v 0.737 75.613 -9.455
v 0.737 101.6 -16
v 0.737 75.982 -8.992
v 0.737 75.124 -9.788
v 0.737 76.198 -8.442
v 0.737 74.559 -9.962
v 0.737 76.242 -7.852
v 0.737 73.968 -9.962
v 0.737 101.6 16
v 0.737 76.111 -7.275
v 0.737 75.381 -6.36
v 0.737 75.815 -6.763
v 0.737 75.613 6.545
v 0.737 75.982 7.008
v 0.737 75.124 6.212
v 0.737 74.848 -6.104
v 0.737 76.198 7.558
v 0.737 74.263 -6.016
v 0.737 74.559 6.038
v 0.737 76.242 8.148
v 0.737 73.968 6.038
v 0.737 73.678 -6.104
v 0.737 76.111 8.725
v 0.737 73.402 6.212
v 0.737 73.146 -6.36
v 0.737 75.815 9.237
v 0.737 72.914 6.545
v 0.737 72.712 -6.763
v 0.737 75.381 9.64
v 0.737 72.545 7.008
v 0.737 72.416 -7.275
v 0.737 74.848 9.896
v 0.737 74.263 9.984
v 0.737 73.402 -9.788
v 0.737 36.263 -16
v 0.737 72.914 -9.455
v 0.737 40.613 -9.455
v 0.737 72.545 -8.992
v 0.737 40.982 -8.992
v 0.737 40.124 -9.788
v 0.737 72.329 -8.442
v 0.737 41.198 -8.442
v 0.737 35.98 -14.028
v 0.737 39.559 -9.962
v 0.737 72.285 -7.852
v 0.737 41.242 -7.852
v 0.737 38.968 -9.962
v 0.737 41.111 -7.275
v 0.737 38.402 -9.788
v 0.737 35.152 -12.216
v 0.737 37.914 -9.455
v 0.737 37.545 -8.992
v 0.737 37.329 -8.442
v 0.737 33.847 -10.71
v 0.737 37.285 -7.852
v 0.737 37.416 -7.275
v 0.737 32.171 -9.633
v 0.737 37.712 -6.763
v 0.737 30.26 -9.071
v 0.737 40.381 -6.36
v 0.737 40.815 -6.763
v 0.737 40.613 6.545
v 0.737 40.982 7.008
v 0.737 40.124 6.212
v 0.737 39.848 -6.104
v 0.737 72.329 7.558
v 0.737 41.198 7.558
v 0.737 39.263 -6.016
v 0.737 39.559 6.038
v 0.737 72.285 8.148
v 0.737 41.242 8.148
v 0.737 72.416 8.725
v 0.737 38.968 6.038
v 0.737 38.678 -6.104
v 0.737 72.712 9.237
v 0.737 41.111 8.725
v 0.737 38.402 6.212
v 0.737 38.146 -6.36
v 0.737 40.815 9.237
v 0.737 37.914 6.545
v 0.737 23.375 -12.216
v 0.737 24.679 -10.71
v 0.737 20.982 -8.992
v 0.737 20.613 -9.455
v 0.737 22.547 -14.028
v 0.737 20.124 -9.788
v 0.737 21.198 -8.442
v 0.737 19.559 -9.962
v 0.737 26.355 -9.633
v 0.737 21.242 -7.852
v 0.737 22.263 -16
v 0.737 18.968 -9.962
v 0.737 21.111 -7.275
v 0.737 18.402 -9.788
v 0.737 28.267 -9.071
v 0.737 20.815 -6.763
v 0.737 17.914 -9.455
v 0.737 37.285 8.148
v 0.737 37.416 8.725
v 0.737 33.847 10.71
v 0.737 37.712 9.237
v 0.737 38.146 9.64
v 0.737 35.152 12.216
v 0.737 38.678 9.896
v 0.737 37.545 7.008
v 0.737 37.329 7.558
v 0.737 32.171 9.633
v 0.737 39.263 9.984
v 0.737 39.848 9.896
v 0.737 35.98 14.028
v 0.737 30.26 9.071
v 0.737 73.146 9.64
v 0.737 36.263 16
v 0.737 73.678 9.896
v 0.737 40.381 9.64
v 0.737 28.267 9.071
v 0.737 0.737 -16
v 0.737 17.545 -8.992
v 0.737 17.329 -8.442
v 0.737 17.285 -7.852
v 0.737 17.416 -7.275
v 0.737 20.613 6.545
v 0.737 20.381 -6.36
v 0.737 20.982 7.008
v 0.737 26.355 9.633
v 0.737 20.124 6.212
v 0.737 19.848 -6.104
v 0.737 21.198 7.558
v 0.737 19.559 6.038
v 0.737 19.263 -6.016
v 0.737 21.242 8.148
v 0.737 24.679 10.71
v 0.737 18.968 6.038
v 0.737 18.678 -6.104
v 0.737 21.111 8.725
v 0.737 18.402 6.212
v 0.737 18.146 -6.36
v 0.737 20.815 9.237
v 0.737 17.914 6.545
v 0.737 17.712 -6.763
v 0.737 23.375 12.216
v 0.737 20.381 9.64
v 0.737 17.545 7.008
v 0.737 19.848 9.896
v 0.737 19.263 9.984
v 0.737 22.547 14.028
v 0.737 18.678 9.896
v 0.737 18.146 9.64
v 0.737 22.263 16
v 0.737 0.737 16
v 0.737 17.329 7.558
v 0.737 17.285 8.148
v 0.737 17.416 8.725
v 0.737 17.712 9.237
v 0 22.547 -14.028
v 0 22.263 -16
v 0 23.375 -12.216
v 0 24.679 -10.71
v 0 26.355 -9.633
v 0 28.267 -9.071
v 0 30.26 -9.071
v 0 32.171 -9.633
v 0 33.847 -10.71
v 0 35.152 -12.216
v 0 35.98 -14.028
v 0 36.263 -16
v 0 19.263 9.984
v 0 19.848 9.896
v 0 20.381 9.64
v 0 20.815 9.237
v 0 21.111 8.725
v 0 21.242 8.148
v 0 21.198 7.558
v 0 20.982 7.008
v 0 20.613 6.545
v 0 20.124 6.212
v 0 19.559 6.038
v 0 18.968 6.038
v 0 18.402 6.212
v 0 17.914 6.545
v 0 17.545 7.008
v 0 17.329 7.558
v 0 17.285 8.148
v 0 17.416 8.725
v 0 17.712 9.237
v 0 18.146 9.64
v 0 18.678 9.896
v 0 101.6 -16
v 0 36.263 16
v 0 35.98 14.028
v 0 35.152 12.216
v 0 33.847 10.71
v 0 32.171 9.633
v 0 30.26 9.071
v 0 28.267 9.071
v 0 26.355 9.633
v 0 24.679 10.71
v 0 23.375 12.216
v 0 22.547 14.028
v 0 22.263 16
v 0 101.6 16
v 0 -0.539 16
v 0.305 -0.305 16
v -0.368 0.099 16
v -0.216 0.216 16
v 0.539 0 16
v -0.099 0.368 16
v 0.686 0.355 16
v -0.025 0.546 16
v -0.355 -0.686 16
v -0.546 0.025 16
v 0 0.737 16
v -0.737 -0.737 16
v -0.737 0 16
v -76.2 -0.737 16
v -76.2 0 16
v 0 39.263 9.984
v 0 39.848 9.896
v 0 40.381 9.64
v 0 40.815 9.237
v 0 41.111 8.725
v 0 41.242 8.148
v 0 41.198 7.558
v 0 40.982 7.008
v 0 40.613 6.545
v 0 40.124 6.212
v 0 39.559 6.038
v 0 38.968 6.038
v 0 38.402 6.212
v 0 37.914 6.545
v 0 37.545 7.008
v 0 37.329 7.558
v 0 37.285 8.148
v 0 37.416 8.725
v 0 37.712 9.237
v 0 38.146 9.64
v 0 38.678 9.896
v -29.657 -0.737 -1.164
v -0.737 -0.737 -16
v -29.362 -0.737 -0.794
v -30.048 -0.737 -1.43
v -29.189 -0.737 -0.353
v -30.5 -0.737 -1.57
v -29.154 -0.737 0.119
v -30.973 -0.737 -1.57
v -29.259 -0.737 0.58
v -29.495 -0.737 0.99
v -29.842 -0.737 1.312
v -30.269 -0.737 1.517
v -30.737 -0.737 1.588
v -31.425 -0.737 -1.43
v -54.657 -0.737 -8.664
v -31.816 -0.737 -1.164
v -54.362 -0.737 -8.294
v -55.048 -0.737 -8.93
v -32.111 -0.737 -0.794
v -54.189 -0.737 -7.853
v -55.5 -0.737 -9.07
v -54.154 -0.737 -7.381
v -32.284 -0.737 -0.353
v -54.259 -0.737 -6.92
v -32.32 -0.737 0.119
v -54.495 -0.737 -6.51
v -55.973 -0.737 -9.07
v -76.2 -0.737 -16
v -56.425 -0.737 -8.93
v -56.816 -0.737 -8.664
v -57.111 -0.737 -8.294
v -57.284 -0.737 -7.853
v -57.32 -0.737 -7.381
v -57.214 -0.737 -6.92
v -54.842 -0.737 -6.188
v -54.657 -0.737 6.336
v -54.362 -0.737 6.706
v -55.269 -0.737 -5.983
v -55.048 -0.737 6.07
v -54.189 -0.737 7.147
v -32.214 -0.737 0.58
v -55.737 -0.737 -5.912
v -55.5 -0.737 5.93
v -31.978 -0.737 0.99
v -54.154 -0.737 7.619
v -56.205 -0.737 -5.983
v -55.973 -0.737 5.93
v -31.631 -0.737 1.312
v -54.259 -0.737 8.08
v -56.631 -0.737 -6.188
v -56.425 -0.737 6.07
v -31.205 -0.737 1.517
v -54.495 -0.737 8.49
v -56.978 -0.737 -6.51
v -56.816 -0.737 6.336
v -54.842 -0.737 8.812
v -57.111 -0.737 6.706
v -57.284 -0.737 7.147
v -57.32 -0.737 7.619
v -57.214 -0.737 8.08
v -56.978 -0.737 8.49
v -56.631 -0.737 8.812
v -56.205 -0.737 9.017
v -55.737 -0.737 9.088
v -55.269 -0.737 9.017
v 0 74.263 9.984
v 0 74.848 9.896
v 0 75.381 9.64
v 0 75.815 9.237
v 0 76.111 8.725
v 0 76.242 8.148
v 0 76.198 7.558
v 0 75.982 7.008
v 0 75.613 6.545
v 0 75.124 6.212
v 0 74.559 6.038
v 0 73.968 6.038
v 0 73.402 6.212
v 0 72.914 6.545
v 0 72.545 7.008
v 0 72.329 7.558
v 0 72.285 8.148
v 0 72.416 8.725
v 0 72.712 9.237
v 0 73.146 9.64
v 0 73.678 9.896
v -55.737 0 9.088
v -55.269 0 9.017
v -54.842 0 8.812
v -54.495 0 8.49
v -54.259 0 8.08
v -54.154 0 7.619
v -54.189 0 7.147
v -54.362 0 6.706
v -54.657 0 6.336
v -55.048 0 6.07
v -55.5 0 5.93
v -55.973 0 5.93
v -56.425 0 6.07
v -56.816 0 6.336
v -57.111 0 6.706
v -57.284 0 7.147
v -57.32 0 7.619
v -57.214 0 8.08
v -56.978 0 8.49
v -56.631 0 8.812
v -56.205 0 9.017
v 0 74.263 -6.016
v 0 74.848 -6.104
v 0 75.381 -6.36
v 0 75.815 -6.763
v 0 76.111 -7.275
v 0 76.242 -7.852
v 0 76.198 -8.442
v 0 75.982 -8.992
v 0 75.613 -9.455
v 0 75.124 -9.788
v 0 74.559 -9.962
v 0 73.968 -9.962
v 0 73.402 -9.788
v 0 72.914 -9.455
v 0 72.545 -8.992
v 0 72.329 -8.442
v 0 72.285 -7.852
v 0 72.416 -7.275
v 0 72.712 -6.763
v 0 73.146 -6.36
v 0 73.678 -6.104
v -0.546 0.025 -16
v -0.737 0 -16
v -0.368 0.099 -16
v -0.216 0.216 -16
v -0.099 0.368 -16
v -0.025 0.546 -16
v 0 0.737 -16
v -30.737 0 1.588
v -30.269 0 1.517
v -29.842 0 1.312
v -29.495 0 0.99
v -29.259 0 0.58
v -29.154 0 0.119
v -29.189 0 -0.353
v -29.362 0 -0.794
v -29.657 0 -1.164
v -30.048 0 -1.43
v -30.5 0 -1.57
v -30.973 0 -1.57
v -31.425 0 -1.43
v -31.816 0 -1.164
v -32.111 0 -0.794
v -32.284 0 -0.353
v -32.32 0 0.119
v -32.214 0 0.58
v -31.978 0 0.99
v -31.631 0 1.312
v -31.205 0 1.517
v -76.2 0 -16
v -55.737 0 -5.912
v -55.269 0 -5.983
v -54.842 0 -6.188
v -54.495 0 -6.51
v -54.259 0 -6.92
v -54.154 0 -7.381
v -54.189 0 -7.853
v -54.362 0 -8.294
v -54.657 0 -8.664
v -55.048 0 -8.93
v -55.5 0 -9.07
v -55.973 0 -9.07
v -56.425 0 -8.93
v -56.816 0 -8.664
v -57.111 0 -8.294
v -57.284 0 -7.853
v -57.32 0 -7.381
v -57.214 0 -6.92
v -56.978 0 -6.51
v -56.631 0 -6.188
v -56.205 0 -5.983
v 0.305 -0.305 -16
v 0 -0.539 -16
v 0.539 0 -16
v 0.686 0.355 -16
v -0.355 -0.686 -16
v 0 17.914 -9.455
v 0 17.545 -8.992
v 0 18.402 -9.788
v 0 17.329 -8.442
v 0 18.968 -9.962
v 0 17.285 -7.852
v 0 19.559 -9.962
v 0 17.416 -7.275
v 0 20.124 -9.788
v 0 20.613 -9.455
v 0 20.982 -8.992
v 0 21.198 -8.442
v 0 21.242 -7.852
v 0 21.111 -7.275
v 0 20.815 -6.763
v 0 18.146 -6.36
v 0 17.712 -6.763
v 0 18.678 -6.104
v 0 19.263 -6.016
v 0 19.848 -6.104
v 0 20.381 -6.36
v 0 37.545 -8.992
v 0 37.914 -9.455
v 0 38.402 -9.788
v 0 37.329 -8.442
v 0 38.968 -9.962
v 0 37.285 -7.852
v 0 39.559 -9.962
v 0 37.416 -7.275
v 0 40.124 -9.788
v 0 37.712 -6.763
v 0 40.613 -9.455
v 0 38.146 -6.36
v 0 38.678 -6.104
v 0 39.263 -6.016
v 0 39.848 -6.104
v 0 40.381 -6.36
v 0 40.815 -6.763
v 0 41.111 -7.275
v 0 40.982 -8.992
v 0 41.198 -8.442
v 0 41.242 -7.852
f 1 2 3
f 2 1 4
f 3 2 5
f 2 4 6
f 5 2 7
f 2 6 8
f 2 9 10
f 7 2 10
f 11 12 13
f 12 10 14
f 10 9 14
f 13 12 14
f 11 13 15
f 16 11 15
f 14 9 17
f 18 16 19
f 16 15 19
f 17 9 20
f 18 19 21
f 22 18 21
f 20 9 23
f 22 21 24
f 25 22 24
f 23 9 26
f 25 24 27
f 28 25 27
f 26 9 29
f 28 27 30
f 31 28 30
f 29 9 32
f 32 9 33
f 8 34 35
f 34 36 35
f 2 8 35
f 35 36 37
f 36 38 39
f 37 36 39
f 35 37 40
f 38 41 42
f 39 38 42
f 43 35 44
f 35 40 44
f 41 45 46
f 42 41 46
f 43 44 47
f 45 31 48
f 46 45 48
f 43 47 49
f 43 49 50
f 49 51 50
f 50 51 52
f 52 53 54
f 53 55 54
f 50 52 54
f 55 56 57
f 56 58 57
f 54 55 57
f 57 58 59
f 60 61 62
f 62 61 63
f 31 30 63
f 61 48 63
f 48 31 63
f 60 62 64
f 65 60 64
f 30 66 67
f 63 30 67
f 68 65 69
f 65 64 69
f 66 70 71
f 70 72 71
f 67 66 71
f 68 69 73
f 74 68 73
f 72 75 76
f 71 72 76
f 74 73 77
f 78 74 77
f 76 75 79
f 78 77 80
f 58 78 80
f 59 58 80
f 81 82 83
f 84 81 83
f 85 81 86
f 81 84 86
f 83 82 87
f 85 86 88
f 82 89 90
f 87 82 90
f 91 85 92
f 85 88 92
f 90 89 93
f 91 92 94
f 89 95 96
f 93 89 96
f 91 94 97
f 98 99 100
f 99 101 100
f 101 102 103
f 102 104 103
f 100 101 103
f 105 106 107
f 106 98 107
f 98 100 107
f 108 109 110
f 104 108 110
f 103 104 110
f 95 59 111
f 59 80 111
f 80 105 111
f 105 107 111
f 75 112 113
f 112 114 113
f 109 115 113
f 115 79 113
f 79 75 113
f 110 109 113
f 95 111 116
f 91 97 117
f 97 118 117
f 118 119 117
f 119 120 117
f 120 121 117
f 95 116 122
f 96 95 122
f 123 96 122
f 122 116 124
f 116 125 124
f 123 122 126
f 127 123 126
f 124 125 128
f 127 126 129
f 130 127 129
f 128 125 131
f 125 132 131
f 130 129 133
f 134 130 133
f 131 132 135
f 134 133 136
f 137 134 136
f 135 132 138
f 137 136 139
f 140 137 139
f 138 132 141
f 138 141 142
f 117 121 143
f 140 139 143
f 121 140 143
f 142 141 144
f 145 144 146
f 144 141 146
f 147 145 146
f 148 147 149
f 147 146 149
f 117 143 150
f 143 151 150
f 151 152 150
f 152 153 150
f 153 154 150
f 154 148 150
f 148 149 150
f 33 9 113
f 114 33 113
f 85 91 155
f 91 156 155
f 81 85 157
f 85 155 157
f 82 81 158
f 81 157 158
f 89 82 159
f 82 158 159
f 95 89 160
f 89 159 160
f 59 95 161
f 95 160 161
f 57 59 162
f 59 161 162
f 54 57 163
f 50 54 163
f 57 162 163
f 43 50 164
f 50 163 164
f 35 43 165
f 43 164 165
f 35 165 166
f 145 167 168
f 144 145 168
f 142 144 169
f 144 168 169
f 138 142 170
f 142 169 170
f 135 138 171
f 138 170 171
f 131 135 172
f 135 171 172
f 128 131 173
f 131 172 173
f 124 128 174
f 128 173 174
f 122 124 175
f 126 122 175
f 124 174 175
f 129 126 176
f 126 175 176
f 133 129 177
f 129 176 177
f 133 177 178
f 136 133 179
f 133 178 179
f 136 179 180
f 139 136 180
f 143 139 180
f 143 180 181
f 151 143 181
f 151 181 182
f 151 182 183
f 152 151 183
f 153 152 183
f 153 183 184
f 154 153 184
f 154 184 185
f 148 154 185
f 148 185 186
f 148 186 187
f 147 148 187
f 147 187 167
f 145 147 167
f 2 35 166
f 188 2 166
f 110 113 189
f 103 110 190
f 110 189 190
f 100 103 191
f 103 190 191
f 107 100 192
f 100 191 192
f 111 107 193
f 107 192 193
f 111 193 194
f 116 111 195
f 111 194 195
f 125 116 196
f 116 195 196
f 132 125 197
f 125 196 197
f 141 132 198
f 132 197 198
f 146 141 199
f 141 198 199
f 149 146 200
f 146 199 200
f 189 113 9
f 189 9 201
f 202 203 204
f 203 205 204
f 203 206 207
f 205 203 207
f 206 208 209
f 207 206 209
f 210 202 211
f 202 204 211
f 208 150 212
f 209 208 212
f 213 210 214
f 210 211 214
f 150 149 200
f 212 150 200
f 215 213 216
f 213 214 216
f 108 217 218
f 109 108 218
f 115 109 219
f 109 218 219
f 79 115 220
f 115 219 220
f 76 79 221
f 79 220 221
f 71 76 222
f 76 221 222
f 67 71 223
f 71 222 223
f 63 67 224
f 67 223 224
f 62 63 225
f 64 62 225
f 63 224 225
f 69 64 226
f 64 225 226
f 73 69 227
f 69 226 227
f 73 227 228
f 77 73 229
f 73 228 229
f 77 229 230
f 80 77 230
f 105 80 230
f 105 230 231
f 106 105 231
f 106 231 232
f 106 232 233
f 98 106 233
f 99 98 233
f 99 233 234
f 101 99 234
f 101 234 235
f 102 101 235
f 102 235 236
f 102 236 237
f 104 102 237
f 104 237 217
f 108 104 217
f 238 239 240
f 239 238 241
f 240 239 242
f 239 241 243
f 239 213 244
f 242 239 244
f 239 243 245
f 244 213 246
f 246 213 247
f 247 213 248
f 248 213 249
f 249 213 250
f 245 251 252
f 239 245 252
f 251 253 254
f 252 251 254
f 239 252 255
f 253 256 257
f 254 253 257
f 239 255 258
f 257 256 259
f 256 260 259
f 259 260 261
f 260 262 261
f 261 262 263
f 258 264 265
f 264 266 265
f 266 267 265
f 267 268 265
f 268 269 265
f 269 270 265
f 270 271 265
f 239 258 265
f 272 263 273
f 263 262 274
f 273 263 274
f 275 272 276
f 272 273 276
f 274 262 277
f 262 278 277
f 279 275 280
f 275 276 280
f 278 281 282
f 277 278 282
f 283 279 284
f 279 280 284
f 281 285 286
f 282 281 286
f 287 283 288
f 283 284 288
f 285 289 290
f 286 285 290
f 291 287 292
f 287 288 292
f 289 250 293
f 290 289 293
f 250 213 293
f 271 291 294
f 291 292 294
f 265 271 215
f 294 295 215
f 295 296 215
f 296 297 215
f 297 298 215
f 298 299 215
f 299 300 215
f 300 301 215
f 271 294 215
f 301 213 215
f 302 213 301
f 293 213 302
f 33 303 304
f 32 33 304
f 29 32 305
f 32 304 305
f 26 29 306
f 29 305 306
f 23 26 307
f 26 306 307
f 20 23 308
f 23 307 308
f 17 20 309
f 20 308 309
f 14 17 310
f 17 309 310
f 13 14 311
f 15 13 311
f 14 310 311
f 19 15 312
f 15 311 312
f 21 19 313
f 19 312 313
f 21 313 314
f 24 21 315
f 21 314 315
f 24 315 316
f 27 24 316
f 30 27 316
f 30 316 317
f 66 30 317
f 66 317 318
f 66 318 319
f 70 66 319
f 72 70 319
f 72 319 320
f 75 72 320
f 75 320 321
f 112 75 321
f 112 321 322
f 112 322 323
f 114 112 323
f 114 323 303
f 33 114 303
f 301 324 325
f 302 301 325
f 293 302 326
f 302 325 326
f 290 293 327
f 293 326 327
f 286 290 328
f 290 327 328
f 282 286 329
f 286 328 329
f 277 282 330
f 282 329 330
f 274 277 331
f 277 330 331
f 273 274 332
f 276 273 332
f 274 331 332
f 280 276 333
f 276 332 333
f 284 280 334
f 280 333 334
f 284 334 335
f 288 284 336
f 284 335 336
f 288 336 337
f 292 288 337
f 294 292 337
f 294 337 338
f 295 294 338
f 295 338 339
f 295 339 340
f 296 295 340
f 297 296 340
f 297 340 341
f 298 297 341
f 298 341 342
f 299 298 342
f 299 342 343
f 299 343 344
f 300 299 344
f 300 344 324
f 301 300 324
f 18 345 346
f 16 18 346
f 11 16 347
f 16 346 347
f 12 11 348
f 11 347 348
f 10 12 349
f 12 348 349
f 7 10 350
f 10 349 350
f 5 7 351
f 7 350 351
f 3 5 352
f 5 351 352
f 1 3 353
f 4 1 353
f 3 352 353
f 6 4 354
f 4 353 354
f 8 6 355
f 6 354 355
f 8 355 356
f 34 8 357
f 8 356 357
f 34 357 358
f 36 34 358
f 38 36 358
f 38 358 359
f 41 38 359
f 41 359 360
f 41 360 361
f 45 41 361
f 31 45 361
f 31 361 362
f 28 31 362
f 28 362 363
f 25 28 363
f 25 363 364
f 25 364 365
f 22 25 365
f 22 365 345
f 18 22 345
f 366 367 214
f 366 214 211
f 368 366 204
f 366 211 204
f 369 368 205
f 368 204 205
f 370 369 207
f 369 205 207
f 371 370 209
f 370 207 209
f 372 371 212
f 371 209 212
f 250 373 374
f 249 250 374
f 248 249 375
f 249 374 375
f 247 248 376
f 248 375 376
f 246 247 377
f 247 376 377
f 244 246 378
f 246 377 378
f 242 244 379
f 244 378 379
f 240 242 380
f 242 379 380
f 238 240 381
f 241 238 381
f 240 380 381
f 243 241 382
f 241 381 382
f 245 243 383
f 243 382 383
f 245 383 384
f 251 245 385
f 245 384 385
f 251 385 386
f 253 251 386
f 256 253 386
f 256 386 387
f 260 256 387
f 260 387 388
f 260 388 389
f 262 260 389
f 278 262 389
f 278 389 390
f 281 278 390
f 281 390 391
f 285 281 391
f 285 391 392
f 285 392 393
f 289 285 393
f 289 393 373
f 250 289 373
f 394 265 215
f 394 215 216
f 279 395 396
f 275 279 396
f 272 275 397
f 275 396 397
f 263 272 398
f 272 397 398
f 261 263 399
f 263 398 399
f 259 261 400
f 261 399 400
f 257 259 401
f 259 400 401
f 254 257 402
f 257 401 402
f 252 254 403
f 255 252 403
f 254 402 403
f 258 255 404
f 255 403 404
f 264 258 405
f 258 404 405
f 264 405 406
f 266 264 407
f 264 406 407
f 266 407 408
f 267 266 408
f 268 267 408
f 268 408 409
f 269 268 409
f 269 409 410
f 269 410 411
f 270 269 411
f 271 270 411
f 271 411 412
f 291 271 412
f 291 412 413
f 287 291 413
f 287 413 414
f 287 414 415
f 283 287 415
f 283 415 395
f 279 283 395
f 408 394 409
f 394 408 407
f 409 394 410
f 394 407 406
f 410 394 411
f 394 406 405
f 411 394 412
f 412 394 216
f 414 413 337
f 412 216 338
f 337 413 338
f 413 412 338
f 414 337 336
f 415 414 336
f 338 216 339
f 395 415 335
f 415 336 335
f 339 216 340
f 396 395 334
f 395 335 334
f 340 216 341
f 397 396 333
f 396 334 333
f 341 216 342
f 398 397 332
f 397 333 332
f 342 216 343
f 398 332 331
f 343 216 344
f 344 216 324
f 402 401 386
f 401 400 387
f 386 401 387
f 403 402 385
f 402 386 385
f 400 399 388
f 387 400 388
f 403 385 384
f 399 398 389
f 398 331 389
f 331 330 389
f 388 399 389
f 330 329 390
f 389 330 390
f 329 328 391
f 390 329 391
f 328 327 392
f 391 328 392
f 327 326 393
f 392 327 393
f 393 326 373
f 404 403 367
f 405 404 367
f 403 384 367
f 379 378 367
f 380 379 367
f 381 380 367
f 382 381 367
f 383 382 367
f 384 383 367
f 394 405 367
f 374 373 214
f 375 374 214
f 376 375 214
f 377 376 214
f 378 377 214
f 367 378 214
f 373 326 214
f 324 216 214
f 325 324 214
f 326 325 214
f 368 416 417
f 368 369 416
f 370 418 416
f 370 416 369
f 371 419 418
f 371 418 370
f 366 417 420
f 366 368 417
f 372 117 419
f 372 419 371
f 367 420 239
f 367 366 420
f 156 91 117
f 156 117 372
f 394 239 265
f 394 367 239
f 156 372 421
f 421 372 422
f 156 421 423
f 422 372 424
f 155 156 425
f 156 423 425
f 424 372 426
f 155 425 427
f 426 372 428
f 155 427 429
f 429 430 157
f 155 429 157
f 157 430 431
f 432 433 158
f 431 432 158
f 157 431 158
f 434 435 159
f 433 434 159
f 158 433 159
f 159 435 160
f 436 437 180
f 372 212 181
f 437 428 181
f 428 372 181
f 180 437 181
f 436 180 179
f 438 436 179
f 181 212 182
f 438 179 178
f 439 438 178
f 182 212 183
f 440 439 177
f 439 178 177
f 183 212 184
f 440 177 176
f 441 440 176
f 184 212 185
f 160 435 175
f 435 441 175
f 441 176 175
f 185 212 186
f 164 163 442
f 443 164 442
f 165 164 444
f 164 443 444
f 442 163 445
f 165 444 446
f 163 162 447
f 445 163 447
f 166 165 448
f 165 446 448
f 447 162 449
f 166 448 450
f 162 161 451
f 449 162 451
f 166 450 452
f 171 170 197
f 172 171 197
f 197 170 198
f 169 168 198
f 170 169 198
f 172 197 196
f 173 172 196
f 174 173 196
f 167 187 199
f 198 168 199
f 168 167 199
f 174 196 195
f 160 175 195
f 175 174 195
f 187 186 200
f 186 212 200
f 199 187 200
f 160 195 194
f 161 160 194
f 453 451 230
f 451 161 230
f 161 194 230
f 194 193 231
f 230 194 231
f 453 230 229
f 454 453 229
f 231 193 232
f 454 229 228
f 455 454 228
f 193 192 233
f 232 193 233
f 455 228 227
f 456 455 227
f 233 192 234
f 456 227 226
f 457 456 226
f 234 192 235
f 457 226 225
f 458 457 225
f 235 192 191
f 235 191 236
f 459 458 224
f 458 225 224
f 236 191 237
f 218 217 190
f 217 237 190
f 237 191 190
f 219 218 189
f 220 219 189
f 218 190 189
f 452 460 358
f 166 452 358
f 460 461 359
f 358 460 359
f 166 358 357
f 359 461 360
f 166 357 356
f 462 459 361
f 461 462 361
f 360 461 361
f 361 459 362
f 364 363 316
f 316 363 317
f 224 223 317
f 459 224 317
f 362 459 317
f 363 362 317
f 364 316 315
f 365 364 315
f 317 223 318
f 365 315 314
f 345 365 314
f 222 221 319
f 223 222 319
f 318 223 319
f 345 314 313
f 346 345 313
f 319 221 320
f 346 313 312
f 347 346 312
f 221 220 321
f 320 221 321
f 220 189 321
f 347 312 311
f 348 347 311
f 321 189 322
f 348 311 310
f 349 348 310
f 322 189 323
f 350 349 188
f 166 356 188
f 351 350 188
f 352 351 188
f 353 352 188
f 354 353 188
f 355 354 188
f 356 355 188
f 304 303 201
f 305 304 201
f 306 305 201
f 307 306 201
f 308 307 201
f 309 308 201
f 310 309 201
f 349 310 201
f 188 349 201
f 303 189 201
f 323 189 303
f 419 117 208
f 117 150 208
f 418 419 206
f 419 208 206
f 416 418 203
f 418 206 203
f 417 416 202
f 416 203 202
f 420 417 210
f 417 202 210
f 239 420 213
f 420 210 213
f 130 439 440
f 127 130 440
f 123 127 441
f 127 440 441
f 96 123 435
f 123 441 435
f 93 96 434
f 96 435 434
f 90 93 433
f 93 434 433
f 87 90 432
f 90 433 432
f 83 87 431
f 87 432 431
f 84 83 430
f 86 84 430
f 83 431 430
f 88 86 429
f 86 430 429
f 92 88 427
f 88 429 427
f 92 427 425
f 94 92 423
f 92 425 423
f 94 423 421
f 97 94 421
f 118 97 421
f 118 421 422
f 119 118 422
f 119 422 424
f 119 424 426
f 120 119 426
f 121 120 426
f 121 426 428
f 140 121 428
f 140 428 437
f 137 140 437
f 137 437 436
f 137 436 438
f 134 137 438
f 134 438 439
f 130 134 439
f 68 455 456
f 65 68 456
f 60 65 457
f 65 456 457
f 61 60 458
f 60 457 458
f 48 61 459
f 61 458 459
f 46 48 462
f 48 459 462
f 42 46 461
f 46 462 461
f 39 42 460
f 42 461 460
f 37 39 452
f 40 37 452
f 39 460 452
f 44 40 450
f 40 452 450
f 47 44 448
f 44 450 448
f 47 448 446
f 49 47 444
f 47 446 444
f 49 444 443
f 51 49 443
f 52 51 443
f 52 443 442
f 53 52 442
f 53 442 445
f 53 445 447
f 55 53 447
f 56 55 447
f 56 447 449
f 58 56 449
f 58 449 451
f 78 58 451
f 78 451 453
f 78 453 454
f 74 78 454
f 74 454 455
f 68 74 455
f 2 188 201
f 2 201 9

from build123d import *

# Parameters (mm, degrees)
BASE_FLANGE1_DEPTH = 16
SKETCH6_R          = 7
SKETCH6_R_2        = 1.984375
CUT_EXTRUDE1_DEPTH = 10
SKETCH7_R          = 1.5875
CUT_EXTRUDE2_DEPTH = 10


# Sheet-metal steps are written as plain solids
with BuildPart() as part:
    # Sketch1 → Base-Flange1 (new, symmetric)
    with BuildSketch(Plane.XY):
        with BuildLine():
            Line((-76.2, 0), (-0.7366, 0))
            ThreePointArc((-0.7366, 0), (-0.215745145, 0.215745145), (0, 0.7366))
            Line((0, 0.7366), (0, 101.6))
            Line((0, 101.6), (0.7366, 101.6))
            Line((0.7366, 101.6), (0.7366, 0.7366))
            ThreePointArc((0.7366, 0.7366), (0.30510971, -0.30510971), (-0.7366, -0.7366))
            Line((-0.7366, -0.7366), (-76.2, -0.7366))
            Line((-76.2, -0.7366), (-76.2, 0))
        make_face()
    extrude(amount=BASE_FLANGE1_DEPTH, both=True)

    # Sketch6 → Cut-Extrude1 (cut)
    with BuildSketch(Plane.ZY):
        with Locations((16, 29.2634)):
            Circle(SKETCH6_R)
        with Locations((8, 19.2634)):
            Circle(SKETCH6_R_2)
        with Locations((8, 39.2634)):
            Circle(SKETCH6_R_2)
        with Locations((8, 74.2634)):
            Circle(SKETCH6_R_2)
        with Locations((-8, 19.2634)):
            Circle(SKETCH6_R_2)
        with Locations((-16, 29.2634)):
            Circle(SKETCH6_R)
        with Locations((-8, 39.2634)):
            Circle(SKETCH6_R_2)
        with Locations((-8, 74.2634)):
            Circle(SKETCH6_R_2)
    extrude(amount=-CUT_EXTRUDE1_DEPTH, mode=Mode.SUBTRACT)

    # Sketch7 → Cut-Extrude2 (cut)
    with BuildSketch(Plane(origin=(0, 0, 0), x_dir=(1, 0, 0), z_dir=(0, 1, 0))):
        with Locations(Location((-30.7366, 0, 0), (0, 0, 270))):
            Circle(SKETCH7_R)
        with Locations(Location((-55.7366, -7.5, 0), (0, 0, 270))):
            Circle(SKETCH7_R)
        with Locations(Location((-55.7366, 7.5, 0), (0, 0, 270))):
            Circle(SKETCH7_R)
    extrude(amount=-CUT_EXTRUDE2_DEPTH, mode=Mode.SUBTRACT)


solid = part.part
